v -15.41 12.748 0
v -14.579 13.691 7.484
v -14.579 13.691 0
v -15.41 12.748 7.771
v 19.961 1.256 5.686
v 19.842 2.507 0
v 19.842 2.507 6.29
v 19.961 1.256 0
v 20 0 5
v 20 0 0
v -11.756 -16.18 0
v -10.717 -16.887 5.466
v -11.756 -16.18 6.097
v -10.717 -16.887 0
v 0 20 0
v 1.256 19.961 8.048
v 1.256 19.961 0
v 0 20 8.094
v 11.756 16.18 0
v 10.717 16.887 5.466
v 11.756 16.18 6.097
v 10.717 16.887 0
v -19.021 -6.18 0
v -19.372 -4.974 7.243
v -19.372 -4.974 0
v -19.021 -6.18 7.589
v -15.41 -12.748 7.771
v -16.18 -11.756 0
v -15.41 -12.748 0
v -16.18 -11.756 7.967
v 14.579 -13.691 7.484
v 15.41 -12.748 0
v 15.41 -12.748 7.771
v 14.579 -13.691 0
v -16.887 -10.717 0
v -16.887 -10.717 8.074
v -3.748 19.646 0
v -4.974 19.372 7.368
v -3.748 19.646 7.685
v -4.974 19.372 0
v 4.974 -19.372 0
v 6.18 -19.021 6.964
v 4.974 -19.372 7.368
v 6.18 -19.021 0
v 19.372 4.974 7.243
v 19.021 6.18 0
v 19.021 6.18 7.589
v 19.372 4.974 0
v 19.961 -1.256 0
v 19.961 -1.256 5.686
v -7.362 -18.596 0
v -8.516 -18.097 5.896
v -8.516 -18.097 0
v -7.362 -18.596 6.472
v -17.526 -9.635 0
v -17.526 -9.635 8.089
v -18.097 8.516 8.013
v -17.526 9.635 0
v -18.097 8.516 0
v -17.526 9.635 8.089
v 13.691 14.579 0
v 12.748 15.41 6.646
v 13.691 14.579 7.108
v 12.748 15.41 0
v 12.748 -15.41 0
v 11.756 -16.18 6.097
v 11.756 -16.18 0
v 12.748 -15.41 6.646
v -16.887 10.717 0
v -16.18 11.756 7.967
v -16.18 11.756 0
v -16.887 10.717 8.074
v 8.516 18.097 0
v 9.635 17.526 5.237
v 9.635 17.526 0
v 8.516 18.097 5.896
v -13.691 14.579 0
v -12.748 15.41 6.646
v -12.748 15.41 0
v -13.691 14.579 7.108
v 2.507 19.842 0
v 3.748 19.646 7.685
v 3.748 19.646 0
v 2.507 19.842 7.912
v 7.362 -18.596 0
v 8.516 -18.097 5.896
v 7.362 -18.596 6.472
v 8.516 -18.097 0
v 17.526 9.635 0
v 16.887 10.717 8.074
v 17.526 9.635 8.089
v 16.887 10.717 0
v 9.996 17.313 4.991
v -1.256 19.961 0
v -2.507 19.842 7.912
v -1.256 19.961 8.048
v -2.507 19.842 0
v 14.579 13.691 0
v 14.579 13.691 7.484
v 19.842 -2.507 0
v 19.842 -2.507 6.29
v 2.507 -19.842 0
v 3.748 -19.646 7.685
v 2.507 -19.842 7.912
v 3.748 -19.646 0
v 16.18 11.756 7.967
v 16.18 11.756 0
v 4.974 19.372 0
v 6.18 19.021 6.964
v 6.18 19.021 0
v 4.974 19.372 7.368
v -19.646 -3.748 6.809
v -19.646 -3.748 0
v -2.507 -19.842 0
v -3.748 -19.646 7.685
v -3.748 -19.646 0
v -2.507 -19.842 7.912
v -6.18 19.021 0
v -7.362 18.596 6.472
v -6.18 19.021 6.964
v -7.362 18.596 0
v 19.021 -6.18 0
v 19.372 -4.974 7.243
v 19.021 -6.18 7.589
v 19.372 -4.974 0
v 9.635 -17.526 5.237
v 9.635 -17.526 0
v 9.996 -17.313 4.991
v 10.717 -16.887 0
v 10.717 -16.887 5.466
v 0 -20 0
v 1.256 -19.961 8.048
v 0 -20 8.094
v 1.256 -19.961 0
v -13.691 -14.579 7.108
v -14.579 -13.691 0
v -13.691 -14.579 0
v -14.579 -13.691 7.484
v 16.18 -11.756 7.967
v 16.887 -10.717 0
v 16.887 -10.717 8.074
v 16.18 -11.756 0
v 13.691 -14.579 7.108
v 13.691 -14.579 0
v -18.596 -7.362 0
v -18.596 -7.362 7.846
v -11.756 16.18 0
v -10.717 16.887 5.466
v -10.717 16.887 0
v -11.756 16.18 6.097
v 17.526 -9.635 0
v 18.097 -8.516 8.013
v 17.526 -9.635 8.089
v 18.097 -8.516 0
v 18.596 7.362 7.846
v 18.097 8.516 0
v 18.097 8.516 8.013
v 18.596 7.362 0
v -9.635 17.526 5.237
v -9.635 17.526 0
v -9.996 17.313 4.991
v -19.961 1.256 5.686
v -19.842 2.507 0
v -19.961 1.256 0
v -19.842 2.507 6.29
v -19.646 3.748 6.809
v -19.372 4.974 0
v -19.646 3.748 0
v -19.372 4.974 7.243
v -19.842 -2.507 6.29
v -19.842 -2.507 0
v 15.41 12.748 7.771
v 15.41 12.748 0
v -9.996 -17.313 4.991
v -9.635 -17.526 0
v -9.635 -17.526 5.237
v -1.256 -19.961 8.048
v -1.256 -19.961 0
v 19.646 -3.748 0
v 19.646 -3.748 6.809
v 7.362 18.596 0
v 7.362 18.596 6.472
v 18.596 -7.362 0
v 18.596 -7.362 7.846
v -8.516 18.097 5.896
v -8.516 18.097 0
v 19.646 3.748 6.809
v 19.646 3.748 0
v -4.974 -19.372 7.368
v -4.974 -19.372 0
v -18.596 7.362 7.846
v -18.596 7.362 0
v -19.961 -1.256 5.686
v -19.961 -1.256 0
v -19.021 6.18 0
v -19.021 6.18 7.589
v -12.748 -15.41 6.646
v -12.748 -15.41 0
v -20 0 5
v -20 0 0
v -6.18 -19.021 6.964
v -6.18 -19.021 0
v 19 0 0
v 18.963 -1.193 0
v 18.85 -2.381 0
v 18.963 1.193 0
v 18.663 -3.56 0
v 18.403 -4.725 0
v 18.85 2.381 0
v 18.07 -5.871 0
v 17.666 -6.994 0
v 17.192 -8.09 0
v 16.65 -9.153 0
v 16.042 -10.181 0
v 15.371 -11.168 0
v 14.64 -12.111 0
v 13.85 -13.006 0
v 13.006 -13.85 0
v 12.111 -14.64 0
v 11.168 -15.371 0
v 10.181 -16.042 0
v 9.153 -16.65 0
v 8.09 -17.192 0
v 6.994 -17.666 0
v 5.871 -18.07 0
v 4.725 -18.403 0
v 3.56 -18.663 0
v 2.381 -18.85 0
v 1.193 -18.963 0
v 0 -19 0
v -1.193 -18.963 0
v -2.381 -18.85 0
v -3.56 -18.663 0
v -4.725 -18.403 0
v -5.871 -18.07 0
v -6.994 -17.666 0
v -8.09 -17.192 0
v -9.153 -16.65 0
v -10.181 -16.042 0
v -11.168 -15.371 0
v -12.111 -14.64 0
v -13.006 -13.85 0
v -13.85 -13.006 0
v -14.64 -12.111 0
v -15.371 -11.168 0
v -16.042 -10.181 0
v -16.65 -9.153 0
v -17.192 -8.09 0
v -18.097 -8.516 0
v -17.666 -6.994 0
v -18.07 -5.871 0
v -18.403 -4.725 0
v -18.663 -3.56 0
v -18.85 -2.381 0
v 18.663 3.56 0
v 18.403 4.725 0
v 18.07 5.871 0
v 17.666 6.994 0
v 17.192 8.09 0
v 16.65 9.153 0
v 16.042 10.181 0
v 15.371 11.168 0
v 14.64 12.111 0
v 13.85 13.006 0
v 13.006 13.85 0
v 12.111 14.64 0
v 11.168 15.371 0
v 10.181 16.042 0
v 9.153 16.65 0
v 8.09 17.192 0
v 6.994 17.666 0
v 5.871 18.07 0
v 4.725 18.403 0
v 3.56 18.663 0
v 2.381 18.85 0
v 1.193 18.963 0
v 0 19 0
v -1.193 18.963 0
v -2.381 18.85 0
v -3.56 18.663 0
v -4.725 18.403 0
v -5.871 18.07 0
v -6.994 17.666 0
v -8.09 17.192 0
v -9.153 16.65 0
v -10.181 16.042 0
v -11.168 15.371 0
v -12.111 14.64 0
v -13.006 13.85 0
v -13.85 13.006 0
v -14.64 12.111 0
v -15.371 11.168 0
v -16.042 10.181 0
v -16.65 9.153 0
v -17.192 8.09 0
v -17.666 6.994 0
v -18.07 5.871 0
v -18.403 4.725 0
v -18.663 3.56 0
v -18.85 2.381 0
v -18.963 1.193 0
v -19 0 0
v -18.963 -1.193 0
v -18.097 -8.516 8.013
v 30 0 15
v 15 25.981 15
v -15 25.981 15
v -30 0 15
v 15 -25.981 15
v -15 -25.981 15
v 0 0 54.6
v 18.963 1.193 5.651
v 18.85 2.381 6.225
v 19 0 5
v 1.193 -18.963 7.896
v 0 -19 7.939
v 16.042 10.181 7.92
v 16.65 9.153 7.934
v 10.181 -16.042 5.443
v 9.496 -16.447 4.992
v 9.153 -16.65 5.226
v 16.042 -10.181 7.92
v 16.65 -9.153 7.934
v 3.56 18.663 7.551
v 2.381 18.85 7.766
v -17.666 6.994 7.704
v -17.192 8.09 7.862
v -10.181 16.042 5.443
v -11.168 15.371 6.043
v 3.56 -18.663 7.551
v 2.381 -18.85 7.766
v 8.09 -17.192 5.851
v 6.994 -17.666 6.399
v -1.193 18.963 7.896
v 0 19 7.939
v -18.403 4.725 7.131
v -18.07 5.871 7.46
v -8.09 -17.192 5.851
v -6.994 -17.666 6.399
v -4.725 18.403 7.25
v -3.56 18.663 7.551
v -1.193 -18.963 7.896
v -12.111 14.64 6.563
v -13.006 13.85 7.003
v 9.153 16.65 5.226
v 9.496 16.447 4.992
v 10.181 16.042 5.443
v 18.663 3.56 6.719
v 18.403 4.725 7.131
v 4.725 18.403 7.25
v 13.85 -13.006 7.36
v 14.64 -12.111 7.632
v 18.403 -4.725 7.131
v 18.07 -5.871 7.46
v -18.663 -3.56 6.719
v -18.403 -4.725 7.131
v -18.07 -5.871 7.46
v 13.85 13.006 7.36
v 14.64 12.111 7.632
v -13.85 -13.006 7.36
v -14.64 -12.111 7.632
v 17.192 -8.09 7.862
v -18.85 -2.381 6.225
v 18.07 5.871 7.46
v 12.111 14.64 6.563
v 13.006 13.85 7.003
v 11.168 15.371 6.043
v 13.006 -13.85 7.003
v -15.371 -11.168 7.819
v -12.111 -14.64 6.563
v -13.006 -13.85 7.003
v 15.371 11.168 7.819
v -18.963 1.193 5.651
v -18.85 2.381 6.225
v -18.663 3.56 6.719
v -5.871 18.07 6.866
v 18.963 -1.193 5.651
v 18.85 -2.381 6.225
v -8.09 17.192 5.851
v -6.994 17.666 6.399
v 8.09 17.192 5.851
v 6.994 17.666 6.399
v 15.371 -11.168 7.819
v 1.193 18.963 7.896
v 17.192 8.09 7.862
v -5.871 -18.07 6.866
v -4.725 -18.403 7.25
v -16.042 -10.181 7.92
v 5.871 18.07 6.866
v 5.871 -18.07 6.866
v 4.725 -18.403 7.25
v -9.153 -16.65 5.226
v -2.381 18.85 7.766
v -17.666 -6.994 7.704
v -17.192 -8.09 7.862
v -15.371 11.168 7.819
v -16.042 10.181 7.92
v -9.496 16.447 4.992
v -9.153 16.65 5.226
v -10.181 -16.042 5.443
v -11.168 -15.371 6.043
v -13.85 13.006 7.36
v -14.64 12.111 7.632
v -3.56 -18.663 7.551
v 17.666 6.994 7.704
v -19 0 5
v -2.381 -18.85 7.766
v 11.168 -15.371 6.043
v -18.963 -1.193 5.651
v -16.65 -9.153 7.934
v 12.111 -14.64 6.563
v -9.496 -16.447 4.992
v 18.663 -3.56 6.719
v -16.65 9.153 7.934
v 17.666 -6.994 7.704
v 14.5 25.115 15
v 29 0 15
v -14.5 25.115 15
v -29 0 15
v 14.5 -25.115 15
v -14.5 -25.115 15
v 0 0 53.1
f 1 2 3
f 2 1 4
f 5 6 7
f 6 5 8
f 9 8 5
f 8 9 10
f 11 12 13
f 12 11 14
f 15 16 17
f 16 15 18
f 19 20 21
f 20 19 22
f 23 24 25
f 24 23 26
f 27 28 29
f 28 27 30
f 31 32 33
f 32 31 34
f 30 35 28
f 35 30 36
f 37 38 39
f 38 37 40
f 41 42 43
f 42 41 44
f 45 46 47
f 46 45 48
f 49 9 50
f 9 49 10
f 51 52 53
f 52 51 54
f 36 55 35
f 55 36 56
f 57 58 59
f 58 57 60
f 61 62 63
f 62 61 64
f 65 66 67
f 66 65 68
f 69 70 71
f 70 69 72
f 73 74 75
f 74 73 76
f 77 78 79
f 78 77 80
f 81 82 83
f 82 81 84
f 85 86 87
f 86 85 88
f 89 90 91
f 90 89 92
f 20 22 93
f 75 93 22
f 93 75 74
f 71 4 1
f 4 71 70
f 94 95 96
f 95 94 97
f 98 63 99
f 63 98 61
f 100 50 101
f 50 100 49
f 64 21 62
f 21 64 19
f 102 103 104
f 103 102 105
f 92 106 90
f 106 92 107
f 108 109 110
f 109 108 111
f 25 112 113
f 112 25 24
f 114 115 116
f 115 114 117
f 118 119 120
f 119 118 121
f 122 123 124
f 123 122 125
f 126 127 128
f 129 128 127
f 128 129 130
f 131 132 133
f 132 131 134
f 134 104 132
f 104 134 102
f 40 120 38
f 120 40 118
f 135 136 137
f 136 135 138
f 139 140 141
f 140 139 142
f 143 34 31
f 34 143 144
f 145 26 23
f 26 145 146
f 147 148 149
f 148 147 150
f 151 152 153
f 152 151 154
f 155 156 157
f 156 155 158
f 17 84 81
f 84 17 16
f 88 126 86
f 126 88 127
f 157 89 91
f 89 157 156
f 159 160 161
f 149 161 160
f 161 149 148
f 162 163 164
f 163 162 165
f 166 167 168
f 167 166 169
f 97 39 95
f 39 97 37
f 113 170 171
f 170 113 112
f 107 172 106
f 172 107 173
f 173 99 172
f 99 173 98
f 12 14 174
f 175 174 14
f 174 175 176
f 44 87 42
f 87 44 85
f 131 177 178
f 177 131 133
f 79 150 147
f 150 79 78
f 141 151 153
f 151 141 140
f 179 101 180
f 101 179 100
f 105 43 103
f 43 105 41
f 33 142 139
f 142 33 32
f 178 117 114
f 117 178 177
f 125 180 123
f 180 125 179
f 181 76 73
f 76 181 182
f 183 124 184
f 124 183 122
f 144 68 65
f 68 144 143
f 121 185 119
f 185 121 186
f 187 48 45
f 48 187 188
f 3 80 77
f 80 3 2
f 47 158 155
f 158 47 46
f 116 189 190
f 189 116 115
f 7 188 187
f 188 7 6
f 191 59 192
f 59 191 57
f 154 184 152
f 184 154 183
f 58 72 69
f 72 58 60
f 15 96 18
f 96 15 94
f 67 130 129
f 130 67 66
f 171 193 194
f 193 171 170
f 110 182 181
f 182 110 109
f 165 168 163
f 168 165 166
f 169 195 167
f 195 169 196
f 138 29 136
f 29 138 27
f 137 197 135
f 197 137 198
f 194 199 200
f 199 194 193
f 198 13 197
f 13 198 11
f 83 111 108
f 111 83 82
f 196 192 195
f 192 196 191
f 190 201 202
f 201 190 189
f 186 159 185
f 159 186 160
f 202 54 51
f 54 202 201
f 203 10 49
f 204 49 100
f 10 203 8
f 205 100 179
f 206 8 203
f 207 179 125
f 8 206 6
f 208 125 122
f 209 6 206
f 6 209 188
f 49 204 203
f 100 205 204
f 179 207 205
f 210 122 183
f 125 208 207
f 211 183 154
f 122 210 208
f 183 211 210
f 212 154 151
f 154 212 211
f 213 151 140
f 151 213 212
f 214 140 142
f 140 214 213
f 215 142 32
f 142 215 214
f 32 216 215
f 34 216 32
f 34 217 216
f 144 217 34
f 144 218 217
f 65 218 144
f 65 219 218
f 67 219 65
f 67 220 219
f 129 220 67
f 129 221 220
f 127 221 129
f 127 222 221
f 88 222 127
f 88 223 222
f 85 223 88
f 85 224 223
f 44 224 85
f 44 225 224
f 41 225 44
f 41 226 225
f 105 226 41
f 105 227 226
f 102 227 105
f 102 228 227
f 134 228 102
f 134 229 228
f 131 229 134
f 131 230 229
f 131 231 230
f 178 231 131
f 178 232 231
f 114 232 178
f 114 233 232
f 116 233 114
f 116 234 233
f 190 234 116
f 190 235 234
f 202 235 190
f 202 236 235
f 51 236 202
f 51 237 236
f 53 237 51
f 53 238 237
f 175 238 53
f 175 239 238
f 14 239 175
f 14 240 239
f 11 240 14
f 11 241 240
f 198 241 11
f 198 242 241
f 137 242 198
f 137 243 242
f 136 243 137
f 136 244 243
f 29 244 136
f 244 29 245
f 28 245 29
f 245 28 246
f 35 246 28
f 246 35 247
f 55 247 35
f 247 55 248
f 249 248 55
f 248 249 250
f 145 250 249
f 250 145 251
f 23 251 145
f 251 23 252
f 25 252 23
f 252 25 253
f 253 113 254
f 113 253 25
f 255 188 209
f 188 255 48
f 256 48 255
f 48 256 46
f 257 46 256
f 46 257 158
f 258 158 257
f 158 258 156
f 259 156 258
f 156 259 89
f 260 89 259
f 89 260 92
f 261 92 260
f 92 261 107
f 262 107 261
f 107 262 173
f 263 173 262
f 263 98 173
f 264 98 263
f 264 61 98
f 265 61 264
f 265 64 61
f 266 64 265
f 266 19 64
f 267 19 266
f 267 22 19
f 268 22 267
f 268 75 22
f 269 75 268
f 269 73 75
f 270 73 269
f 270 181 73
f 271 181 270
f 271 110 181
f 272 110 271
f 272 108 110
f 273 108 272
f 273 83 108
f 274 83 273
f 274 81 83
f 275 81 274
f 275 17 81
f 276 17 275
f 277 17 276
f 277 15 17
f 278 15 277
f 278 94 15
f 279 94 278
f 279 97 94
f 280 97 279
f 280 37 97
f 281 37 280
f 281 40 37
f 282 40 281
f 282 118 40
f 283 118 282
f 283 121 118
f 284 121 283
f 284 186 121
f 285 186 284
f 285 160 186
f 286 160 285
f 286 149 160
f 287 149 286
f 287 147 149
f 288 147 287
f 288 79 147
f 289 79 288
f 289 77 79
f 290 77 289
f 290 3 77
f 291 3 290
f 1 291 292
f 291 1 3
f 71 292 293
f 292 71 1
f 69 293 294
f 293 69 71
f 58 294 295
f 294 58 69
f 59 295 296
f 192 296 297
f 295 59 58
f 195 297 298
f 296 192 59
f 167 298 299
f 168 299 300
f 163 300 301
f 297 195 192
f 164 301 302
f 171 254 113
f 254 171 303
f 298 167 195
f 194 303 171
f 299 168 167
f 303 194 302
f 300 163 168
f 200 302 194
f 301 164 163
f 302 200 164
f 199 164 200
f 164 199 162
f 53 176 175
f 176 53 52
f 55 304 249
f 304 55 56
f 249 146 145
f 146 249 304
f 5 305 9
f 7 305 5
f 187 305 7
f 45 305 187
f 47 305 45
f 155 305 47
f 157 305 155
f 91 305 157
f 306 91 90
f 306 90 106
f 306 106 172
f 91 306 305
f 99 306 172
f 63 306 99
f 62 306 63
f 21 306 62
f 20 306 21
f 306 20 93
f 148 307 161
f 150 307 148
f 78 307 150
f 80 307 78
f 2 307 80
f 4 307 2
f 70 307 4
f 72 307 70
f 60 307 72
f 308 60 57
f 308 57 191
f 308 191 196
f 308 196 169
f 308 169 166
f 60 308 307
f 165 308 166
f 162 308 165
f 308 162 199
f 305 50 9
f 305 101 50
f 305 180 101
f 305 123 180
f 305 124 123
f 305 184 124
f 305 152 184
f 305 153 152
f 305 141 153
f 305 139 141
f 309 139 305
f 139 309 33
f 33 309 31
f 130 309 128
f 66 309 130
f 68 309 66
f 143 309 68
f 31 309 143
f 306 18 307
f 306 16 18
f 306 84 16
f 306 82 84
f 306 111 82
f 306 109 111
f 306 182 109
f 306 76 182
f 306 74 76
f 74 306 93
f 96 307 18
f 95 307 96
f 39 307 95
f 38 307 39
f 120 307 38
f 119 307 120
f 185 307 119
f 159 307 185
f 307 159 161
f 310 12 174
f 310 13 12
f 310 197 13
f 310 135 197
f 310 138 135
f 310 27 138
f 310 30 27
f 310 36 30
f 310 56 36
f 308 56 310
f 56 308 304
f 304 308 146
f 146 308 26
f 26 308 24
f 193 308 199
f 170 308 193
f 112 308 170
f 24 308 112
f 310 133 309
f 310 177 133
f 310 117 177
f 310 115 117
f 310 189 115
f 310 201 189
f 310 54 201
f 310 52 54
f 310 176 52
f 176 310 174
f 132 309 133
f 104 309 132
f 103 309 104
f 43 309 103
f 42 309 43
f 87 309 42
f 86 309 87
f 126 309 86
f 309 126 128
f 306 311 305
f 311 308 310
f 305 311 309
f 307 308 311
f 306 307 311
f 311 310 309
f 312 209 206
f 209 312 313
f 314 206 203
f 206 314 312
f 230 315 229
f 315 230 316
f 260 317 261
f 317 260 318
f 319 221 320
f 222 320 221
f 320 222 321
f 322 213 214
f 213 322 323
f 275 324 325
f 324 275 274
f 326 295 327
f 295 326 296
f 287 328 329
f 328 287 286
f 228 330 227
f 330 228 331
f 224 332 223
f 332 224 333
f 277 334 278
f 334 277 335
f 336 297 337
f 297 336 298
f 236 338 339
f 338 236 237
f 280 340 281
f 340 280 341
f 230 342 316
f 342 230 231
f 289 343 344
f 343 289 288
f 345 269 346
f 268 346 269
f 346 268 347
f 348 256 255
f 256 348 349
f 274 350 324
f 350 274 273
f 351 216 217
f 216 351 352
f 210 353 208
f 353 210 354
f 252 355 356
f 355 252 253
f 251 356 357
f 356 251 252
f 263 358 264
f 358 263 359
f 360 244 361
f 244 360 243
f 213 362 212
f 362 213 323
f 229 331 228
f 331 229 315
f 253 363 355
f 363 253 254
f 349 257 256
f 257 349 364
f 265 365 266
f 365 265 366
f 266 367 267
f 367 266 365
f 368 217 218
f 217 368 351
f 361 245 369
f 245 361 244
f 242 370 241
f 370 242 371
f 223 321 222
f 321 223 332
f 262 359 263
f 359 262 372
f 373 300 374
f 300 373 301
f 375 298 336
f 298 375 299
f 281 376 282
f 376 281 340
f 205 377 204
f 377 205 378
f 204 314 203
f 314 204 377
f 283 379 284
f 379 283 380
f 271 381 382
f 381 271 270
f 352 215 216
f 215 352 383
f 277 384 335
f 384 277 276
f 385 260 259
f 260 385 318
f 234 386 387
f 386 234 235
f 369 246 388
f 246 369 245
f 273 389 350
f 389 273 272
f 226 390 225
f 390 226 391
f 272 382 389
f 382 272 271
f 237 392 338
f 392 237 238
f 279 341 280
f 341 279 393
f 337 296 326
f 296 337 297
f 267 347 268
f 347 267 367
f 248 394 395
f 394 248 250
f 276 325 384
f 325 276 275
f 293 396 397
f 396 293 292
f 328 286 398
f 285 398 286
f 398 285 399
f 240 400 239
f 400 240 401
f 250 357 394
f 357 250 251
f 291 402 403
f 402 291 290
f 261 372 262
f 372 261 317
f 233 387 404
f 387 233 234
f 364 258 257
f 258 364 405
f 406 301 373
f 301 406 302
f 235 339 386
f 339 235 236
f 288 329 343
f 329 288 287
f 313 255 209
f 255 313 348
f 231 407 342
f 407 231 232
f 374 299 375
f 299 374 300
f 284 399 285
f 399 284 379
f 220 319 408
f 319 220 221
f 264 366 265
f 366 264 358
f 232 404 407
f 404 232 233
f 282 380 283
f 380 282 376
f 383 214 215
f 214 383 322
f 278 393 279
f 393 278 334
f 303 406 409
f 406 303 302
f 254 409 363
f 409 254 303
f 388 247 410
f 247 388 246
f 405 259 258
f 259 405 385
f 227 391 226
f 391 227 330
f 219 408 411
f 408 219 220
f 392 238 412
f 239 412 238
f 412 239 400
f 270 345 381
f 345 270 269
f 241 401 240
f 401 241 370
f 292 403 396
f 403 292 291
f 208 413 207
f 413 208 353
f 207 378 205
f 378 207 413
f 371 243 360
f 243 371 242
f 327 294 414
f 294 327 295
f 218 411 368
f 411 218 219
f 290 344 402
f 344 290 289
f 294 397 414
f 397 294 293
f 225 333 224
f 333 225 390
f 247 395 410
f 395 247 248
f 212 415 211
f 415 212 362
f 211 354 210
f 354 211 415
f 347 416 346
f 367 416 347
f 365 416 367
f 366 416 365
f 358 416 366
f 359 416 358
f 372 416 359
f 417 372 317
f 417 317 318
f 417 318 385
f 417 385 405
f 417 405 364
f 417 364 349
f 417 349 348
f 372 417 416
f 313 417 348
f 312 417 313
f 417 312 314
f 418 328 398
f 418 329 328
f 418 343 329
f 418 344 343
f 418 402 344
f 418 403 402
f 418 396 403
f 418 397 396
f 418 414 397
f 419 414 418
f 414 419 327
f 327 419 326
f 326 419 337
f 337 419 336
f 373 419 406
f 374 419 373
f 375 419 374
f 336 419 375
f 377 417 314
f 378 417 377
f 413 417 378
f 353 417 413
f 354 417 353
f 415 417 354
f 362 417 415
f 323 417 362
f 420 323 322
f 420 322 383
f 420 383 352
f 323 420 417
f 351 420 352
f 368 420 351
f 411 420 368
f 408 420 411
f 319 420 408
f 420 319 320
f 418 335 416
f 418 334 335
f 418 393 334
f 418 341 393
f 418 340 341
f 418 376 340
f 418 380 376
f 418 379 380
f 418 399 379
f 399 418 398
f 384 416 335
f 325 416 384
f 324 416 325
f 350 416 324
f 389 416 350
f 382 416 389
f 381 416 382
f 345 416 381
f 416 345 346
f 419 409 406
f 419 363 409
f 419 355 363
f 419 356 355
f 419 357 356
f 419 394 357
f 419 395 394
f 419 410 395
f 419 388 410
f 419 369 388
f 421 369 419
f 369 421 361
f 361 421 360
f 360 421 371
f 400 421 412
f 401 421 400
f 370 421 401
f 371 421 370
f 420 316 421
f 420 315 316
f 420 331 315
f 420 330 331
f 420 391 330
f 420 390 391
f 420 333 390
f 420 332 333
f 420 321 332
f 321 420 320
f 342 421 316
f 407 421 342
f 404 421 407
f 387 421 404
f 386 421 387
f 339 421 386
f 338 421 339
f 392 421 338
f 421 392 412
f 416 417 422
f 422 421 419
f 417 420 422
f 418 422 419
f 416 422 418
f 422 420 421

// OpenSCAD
//Lamp cap diamond.
//You can adjust the five variables below
base=40;      //Diameter of base for lamp
rim=5;            //Length of rim at base
size=60;        //Size of diamond
facets=6;       //Number of sides (default 6)
scaling=0.66; //Ratio of length to width (default 0.66)
//Don't change variables below here
halfsize=size/2;
$fn=facets;
difference(){
union(){
//outer body
translate([0,0,0])
cylinder(h=4+rim,d1=base,d2=base,$fn=100);
translate([0,0,-(base/2)+rim])
cylinder(h=halfsize,d1=0,d2=size);
translate([0,0,halfsize-(base/2)+rim])
cylinder(h=size*scaling,d1=size,d2=0);
}
//Inner core.
translate([0,0,-1])
cylinder(h=6+rim,d1=base-2,d2=base-2,$fn=100);
translate([0,0,-(base/2)+rim+1])
cylinder(h=halfsize-1,d1=0,d2=size-2);
translate([0,0,halfsize-(base/2)+rim])
cylinder(h=size*scaling-1.5,d1=size-2,d2=0);
translate([-halfsize,-halfsize,-halfsize])
cube([size,size,halfsize]);
//x-ray box
//translate([-80,-80,-50])
//cube([160,80,260]);
}
